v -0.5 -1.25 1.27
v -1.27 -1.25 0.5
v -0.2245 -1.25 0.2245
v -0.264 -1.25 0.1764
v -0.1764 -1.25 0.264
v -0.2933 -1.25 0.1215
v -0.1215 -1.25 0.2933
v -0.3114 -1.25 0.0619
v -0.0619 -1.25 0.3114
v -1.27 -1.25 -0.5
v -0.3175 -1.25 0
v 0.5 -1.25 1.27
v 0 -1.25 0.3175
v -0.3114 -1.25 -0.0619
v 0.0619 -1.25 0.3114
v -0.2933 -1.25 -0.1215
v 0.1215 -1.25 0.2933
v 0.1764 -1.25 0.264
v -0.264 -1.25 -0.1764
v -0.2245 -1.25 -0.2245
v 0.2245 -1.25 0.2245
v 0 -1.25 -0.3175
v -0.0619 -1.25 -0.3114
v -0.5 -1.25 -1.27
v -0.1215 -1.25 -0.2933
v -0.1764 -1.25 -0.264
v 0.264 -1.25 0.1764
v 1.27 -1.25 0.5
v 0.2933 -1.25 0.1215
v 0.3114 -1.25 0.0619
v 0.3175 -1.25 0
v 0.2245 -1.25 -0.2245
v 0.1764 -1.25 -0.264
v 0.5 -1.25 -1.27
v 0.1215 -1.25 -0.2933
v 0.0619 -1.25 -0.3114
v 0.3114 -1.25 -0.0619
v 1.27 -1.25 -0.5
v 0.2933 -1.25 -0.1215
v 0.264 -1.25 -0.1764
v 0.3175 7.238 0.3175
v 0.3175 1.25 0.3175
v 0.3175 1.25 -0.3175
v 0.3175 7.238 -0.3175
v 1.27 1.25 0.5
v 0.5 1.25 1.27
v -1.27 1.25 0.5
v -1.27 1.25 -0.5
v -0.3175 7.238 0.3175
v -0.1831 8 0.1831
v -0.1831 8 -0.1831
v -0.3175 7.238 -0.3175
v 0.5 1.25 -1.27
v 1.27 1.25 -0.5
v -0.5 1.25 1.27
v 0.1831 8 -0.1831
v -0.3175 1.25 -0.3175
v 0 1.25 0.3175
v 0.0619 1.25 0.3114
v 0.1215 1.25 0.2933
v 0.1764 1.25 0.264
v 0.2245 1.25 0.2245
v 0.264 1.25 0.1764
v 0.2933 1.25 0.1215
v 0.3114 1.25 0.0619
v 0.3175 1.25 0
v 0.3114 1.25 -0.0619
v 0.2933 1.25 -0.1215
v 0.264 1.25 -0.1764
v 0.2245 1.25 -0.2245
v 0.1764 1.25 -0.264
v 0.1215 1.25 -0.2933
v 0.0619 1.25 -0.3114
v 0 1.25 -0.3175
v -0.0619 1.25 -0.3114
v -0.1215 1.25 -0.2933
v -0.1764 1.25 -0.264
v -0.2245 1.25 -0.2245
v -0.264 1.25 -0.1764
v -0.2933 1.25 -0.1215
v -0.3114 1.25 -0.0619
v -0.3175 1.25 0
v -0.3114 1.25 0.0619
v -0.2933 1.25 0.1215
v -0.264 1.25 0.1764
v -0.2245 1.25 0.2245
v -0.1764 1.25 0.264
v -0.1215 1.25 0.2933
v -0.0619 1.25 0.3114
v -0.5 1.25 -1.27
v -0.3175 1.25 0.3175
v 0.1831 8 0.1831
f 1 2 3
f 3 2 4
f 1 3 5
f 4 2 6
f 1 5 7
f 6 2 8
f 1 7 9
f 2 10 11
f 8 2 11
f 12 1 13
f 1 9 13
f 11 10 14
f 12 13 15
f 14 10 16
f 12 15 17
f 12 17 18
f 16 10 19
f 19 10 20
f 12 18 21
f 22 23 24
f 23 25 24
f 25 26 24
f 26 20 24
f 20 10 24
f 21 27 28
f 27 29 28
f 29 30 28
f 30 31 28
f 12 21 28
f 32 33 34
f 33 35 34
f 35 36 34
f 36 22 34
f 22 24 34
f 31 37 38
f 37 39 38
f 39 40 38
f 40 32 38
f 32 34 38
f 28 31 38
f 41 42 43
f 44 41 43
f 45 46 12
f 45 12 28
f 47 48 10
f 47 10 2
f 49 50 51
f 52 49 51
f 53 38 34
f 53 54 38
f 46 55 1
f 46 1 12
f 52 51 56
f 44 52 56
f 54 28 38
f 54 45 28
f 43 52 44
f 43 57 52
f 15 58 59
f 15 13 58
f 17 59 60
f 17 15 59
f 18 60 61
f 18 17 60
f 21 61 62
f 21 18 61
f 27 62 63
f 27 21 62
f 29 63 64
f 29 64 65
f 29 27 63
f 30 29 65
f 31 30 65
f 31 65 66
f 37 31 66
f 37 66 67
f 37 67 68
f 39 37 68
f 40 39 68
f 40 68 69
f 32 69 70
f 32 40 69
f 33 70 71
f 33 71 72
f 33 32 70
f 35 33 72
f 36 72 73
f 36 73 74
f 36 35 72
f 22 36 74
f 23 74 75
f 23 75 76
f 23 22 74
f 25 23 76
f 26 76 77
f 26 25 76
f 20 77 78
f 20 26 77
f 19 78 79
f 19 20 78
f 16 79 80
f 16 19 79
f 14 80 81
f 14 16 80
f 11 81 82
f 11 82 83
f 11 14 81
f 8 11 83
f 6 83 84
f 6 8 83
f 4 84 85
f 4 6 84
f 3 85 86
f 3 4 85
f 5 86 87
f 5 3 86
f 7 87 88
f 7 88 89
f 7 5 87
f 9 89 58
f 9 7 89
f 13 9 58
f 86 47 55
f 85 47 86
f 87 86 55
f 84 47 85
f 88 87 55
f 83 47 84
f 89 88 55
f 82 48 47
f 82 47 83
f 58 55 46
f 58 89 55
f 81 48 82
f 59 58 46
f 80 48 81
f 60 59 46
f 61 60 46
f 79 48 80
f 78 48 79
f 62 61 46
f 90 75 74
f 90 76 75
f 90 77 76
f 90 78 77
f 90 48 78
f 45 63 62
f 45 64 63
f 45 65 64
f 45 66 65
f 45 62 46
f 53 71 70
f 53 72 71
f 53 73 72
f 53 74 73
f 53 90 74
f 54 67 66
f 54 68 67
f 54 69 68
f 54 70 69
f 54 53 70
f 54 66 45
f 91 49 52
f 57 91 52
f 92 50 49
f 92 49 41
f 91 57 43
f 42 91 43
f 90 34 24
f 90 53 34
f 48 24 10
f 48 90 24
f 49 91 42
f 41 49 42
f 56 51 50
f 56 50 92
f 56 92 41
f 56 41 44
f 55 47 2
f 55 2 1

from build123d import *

# Parameters (mm, degrees)
SKETCH1_R             = 0.3175
BOSS_EXTRUDE1_DEPTH   = 1.25
SKETCH2_W             = 0.635
SKETCH2_H             = 0.635
BOSS_EXTRUDE2_DEPTH   = 6.75
CHAMFER2_SIZE         = 0.762
CHAMFER2_SIZE2        = 0.134361159
CHAMFER2_PART_2_SIZE  = 0.762
CHAMFER2_PART_2_SIZE2 = 0.134361159
CHAMFER2_PART_3_SIZE  = 0.762
CHAMFER2_PART_3_SIZE2 = 0.134361159
CHAMFER2_PART_4_SIZE  = 0.762
CHAMFER2_PART_4_SIZE2 = 0.134361159


with BuildPart() as part:
    # Sketch1 → Boss-Extrude1 (new body, symmetric)
    with BuildSketch(Plane(origin=(0, 0, 0), x_dir=(1, 0, 0), z_dir=(0, 1, 0))):
        Polygon((-0.5, 1.27), (-1.27, 0.5), (-1.27, -0.5), (-0.5, -1.27), (0.5, -1.27), (1.27, -0.5), (1.27, 0.5), (0.5, 1.27), align=None)
        with Locations(Location((0, 0, 0), (0, 0, 270))):  # turned: the seam where the file's is
            Circle(SKETCH1_R, mode=Mode.SUBTRACT)
    extrude(amount=BOSS_EXTRUDE1_DEPTH, both=True)


with BuildPart() as body_2:
    # Sketch2 → Boss-Extrude2 (new body)
    with BuildSketch(Plane(origin=(0, 1.25, 0), x_dir=(1, 0, 0), z_dir=(0, 1, 0))):
        Rectangle(SKETCH2_W, SKETCH2_H)
    extrude(amount=BOSS_EXTRUDE2_DEPTH)

    # Chamfer2
    chamfer2_edges = [body_2.edges().sort_by_distance(p)[0] for p in [
        (-0.3175, 8, 0),
    ]]
    chamfer2_side = [body_2.faces().sort_by_distance(p)[0] for p in [
        (-0.3175, 4.625, 0),
    ]]
    chamfer(chamfer2_edges, length=CHAMFER2_SIZE, length2=CHAMFER2_SIZE2, reference=chamfer2_side[0])

    # Chamfer2 part 2
    chamfer2_part_2_edges = [body_2.edges().sort_by_distance(p)[0] for p in [
        (0, 8, 0.3175),
    ]]
    chamfer2_part_2_side = [body_2.faces().sort_by_distance(p)[0] for p in [
        (0, 4.625, 0.3175),
    ]]
    chamfer(chamfer2_part_2_edges, length=CHAMFER2_PART_2_SIZE, length2=CHAMFER2_PART_2_SIZE2, reference=chamfer2_part_2_side[0])

    # Chamfer2 part 3
    chamfer2_part_3_edges = [body_2.edges().sort_by_distance(p)[0] for p in [
        (0.3175, 8, 0),
    ]]
    chamfer2_part_3_side = [body_2.faces().sort_by_distance(p)[0] for p in [
        (0.3175, 4.625, 0),
    ]]
    chamfer(chamfer2_part_3_edges, length=CHAMFER2_PART_3_SIZE, length2=CHAMFER2_PART_3_SIZE2, reference=chamfer2_part_3_side[0])

    # Chamfer2 part 4
    chamfer2_part_4_edges = [body_2.edges().sort_by_distance(p)[0] for p in [
        (0, 8, -0.3175),
    ]]
    chamfer2_part_4_side = [body_2.faces().sort_by_distance(p)[0] for p in [
        (0, 4.625, -0.3175),
    ]]
    chamfer(chamfer2_part_4_edges, length=CHAMFER2_PART_4_SIZE, length2=CHAMFER2_PART_4_SIZE2, reference=chamfer2_part_4_side[0])


solid = Compound([part.part, body_2.part])
